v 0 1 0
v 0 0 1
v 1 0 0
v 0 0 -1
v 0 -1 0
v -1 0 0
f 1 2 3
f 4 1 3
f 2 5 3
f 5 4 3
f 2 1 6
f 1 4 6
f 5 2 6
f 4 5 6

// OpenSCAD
// Volume: 1.3333333333333333, SurfaceArea: 6.928203230275509
polyhedron(points = [
 [1,0,0], [0,0,1], [0,1,0],
 [1,0,0], [0,1,0], [0,0,-1],
 [1,0,0], [0,-1,0], [0,0,1],
 [1,0,0], [0,0,-1], [0,-1,0],
 [-1,0,0], [0,1,0], [0,0,1],
 [-1,0,0], [0,0,-1], [0,1,0],
 [-1,0,0], [0,0,1], [0,-1,0],
 [-1,0,0], [0,-1,0], [0,0,-1],
],
faces = [
 [0,1,2],
 [3,4,5],
 [6,7,8],
 [9,10,11],
 [12,13,14],
 [15,16,17],
 [18,19,20], 
 [21,22,23]
]);
